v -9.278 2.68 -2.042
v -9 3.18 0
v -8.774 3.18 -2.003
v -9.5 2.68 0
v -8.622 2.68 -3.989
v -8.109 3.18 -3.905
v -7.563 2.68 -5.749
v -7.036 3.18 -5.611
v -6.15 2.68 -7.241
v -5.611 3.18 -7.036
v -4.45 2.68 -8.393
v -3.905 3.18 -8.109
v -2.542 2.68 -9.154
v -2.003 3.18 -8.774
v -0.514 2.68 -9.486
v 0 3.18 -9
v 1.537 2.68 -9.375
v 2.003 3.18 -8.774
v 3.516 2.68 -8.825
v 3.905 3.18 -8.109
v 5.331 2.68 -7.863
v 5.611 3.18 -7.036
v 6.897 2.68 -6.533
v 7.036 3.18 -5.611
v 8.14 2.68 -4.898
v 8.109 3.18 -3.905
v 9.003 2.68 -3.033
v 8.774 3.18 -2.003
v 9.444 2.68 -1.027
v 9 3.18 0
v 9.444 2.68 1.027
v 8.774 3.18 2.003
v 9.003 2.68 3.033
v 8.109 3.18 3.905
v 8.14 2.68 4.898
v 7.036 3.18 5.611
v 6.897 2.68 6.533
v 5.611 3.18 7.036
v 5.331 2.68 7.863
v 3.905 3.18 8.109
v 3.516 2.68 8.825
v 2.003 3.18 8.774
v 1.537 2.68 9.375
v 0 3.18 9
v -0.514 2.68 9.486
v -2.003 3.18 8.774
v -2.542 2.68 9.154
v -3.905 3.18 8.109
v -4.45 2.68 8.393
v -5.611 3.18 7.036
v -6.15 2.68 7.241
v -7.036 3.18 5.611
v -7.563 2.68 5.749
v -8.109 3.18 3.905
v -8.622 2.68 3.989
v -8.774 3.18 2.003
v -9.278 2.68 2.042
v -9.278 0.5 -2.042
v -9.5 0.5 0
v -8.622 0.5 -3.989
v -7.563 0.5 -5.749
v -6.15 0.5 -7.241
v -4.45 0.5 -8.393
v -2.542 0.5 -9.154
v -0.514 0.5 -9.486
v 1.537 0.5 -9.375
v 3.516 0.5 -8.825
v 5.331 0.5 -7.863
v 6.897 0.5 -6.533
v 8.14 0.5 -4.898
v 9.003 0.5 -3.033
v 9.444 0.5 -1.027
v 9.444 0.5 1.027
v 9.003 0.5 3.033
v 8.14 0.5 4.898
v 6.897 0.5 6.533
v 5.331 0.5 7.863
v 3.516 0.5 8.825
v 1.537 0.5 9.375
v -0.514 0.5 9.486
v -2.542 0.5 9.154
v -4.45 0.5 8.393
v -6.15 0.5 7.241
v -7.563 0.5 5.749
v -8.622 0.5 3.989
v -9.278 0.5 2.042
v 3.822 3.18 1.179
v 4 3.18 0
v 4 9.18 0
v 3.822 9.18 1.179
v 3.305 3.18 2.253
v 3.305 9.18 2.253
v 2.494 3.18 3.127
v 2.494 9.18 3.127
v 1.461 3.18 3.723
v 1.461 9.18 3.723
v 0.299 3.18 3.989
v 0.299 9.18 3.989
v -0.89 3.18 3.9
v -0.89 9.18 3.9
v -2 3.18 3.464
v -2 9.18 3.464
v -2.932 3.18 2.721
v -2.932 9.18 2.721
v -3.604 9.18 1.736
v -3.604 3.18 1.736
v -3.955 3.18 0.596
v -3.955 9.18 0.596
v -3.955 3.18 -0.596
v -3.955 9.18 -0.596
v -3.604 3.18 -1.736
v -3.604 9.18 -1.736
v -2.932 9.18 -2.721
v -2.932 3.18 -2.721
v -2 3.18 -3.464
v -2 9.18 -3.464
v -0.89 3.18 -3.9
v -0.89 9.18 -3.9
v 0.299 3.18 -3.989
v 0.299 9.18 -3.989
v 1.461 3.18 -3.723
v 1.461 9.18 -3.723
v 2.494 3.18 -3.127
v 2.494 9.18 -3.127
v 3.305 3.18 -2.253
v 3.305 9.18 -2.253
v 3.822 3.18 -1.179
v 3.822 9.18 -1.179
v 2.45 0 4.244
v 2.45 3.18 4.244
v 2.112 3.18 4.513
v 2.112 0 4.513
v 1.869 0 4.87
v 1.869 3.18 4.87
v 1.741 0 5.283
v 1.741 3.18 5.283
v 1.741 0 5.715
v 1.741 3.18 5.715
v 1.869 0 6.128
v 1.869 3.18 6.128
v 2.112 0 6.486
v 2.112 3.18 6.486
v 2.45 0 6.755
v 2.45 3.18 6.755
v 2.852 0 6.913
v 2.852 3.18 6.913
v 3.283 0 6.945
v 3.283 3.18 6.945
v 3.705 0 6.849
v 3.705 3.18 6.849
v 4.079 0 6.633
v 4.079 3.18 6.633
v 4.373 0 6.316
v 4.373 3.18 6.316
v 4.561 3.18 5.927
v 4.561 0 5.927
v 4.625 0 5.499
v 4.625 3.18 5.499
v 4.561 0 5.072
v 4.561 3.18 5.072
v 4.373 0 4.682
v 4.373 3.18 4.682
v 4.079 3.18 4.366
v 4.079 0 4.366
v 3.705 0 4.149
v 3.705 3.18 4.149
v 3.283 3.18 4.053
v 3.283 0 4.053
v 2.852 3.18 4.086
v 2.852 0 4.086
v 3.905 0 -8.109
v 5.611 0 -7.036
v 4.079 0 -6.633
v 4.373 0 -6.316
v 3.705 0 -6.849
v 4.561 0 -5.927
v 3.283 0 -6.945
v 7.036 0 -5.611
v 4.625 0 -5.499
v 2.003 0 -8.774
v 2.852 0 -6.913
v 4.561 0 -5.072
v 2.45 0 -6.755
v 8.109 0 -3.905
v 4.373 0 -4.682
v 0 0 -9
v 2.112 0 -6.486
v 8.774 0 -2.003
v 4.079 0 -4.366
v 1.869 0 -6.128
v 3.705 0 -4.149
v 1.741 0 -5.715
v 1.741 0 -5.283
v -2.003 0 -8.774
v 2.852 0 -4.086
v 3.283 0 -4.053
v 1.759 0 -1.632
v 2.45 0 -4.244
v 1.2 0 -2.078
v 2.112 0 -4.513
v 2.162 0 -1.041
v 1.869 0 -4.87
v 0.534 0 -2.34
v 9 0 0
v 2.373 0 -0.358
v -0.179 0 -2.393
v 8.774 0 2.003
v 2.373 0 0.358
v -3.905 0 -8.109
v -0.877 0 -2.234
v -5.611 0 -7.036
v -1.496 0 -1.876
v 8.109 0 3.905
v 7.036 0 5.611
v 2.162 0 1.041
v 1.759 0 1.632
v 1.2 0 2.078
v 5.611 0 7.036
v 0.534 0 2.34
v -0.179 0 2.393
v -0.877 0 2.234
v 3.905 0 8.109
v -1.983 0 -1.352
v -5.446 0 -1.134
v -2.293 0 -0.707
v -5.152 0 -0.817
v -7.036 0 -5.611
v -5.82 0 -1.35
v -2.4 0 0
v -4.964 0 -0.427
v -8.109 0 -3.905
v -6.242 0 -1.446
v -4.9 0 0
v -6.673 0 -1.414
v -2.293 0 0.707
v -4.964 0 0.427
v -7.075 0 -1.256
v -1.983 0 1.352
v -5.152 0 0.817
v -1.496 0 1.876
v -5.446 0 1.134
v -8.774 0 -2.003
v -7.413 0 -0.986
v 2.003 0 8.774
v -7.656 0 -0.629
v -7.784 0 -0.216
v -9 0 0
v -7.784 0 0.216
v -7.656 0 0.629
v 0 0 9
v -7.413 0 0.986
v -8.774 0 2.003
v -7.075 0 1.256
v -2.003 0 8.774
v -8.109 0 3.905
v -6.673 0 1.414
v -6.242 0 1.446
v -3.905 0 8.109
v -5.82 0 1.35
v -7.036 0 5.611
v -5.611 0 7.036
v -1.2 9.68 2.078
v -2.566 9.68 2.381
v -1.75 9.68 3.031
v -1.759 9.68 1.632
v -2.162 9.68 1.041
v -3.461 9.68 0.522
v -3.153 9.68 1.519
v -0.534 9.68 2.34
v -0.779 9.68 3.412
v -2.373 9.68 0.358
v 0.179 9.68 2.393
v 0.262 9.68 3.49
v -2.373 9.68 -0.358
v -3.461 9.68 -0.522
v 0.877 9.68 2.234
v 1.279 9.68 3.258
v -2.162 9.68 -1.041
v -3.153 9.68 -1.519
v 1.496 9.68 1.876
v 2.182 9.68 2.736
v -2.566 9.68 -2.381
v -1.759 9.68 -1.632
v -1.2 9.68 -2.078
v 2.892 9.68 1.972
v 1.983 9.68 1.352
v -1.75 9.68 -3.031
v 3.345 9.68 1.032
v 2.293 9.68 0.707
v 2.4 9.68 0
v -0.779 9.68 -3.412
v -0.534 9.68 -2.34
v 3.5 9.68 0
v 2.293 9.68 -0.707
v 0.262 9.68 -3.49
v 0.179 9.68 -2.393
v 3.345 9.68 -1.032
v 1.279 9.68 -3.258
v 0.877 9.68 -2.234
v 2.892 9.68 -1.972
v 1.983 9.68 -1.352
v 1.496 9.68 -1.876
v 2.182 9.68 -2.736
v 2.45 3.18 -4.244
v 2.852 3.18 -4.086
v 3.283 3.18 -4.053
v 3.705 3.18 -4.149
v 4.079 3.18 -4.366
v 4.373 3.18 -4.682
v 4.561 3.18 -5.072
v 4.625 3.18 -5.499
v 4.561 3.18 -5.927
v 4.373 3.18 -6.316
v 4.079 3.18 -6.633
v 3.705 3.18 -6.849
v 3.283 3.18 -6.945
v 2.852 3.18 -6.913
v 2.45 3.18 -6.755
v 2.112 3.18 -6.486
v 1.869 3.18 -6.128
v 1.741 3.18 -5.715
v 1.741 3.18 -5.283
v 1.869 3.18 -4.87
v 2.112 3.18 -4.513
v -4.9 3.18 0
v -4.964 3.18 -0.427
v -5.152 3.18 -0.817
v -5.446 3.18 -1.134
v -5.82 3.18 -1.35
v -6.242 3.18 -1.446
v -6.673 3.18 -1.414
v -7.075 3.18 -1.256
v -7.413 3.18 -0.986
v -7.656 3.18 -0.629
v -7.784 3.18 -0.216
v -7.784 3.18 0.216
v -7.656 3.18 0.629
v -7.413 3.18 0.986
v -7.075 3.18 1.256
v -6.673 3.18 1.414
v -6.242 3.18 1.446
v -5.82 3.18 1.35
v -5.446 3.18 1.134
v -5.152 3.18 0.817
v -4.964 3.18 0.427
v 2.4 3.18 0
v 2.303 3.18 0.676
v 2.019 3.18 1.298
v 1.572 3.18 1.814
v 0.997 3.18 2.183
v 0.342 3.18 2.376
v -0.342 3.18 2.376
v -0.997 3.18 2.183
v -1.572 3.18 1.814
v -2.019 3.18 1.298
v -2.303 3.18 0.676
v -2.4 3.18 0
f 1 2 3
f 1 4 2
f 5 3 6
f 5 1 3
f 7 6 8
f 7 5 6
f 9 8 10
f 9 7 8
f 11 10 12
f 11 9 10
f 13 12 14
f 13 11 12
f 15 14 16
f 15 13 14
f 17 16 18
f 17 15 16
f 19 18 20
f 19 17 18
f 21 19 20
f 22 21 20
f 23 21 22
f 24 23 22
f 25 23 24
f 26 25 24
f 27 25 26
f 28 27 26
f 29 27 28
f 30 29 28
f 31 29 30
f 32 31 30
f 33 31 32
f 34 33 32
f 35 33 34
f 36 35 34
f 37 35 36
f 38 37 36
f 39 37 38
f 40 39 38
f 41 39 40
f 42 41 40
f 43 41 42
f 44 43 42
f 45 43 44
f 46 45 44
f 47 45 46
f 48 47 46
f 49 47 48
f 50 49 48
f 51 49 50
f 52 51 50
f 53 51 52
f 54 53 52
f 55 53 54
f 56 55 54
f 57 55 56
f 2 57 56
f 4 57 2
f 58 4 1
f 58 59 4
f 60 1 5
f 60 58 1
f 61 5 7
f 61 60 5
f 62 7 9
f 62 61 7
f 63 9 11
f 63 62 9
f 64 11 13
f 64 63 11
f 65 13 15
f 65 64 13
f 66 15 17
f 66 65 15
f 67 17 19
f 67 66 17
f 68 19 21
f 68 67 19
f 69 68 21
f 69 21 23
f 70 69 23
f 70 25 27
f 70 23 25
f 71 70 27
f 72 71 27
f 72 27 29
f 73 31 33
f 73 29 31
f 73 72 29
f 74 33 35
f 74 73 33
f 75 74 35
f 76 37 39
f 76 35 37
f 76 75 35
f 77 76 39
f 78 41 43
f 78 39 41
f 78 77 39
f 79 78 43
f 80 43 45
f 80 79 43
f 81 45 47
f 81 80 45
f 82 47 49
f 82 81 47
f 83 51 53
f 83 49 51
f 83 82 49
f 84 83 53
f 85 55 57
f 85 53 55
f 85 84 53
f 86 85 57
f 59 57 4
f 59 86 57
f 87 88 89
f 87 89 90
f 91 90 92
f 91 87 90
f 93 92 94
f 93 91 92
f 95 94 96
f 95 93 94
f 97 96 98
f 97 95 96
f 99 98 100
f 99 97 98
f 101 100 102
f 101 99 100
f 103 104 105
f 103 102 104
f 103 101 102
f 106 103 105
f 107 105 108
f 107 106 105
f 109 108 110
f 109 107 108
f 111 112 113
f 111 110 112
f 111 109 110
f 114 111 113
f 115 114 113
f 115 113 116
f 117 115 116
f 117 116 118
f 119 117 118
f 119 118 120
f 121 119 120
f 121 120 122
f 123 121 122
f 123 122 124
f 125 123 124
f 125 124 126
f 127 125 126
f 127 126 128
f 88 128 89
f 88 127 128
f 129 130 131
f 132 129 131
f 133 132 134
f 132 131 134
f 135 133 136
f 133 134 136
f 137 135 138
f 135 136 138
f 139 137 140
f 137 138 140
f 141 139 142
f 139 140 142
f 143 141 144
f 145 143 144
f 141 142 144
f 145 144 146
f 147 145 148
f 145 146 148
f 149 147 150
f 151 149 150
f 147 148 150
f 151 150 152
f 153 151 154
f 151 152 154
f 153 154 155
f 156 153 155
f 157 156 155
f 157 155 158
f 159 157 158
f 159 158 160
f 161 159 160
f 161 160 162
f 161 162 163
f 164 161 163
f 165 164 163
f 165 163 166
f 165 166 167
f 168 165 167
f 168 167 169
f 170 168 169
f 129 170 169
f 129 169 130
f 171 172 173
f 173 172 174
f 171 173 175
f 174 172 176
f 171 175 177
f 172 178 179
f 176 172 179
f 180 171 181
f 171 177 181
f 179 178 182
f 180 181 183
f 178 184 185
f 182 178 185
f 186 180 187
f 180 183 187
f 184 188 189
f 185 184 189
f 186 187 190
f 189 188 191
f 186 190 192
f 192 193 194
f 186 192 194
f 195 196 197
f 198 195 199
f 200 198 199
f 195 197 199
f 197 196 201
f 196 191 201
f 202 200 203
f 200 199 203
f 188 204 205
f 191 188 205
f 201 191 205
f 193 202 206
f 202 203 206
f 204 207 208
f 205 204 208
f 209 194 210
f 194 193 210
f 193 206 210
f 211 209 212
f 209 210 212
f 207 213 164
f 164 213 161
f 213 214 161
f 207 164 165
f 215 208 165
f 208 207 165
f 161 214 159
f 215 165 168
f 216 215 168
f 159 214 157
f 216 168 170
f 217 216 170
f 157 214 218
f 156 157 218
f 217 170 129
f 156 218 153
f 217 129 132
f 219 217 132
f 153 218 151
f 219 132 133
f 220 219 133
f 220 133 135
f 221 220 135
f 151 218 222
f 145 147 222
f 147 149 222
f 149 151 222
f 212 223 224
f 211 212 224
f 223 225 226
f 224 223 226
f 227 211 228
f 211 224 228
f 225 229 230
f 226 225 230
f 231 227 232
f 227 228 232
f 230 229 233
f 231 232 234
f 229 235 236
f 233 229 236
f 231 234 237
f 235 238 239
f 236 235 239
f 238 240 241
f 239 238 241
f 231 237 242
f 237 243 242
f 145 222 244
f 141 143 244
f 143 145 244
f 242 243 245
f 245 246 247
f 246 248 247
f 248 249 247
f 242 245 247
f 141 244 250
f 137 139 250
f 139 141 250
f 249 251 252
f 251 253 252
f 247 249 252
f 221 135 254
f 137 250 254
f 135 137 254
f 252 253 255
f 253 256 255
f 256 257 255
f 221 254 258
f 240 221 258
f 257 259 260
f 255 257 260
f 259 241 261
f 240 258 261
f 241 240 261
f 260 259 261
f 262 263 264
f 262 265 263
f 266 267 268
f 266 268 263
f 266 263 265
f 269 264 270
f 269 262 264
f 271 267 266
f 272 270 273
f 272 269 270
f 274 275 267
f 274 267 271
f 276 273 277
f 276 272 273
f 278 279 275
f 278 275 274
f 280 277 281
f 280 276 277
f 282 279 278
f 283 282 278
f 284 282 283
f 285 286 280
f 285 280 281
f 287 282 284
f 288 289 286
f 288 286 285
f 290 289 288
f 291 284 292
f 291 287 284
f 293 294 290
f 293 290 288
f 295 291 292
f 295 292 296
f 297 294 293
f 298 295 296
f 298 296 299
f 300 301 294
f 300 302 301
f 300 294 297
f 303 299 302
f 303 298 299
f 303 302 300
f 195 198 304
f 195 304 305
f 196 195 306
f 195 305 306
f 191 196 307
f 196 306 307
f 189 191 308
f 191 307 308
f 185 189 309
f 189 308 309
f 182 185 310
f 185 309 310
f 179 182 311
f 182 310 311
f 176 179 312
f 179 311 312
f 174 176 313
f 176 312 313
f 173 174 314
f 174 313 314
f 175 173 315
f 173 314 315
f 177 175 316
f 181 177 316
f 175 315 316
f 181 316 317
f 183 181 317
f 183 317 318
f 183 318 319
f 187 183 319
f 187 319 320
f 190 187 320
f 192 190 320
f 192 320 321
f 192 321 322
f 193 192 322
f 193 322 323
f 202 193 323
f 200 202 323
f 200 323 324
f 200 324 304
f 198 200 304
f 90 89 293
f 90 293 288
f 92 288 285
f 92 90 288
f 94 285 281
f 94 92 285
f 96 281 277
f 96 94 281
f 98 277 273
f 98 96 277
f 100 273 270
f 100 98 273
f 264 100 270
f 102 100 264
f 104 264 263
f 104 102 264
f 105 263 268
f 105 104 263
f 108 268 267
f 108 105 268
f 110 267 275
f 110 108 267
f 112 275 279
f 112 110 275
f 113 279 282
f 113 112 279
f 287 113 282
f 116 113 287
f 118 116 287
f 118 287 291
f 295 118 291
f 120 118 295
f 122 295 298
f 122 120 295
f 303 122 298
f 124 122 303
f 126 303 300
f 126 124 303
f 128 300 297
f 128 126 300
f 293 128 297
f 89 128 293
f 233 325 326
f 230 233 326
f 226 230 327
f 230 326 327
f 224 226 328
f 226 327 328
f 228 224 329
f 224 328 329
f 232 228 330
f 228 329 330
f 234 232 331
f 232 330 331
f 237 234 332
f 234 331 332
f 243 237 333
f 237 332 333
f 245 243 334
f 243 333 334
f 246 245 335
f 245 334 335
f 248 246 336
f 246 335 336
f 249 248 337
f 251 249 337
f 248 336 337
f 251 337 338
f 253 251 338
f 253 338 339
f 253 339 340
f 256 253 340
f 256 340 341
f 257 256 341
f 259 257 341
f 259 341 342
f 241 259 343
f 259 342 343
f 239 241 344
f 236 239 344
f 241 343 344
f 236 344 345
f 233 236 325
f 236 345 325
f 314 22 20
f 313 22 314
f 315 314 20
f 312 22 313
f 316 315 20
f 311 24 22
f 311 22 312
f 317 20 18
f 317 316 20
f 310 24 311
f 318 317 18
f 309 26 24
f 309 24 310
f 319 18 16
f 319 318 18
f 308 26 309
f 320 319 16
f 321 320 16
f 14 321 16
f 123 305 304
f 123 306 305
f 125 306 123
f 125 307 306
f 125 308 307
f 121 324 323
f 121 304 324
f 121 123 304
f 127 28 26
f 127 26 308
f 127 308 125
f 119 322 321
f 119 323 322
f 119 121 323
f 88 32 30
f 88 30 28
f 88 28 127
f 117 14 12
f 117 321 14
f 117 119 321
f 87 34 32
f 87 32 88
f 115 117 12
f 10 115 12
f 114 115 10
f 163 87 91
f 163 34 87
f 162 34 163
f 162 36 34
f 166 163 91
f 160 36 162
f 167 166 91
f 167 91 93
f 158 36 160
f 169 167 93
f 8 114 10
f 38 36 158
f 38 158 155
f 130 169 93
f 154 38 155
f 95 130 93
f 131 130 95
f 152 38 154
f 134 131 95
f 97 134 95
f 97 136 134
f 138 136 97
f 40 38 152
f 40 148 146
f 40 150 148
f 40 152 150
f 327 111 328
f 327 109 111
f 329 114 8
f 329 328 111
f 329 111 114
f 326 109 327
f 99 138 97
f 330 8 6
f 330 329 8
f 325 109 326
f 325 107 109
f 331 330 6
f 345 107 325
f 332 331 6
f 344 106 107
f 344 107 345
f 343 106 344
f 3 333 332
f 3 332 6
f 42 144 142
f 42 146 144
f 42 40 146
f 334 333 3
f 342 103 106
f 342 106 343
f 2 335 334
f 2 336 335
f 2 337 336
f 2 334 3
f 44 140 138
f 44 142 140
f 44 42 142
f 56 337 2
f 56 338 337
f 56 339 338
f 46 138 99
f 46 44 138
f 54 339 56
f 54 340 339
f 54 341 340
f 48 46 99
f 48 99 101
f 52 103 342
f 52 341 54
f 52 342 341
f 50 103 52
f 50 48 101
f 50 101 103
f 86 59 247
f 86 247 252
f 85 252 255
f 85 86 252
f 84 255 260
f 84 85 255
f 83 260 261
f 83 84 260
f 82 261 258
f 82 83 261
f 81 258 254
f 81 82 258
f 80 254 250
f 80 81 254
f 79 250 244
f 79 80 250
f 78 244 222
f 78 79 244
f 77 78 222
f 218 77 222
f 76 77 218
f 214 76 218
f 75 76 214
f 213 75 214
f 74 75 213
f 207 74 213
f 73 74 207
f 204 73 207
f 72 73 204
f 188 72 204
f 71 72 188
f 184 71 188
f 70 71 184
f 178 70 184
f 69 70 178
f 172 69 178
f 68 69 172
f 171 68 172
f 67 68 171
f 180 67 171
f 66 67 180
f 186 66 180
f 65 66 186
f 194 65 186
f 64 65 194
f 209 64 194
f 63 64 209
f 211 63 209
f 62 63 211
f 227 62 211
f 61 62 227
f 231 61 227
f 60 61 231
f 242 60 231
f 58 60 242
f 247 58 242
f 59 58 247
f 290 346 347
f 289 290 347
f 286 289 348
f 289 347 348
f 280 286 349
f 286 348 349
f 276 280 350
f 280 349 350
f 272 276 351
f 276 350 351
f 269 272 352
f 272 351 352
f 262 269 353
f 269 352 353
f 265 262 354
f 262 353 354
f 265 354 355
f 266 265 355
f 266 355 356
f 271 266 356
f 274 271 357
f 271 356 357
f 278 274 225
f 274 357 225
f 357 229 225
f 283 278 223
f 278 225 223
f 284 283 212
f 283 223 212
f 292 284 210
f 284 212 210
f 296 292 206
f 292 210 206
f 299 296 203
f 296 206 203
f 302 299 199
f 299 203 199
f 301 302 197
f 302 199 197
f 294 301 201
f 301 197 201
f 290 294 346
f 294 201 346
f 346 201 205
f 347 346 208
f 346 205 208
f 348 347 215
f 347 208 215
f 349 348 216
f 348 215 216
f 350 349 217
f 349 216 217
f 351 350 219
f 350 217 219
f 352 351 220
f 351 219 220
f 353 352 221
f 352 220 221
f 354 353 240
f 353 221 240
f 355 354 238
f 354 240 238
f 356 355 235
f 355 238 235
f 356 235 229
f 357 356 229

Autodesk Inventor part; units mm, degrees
ref_plane "YZ Plane" through (0, 0, 0) normal (1, 0, 0) x (0, 1, 0)
ref_plane "XZ Plane" through (0, 0, 0) normal (0, 1, 0) x (-1, 0, 0)
ref_plane "XY Plane" through (0, 0, 0) normal (0, 0, 1) x (1, 0, 0)
sketch "Sketch1" plane through (0, 0, 0) normal (0, 1, 0) x (-1, 0, 0)
  circle A0 centre (0, 0) radius 9.5
  circle A1 centre (0, 0) radius 2.4
  dimension "d0" = 19
  dimension "d1" = 4.8
extrude "Extrusion1" add sketch "Sketch1" along normal blind 3.18
sketch "Sketch2" plane through (0, 3.18, 0) normal (0, 1, 0) x (1, 0, 0)
  circle A0 centre (0, 0) radius 2.4
  circle A1 centre (0, 0) radius 4
  circle A2 centre (0, 0) radius 2.4 projected
  dimension "d4" = 8
extrude "Extrusion2" add sketch "Sketch2" along normal blind 6.5
sketch "Sketch3" plane through (0, 3.18, 0) normal (0, 1, 0) x (1, 0, 0)
  circle A0 centre (-6.35, 0) radius 1.45
  circle A1 centre (0, 0) radius 6.35 construction
  dimension "d8" = 12.7
  dimension "d7" = 2.9
extrude "Extrusion3" cut sketch "Sketch3" against normal blind 6.5
pattern_circular "Circular Pattern1" count 3 over 360 about axis through (0, 3.18, 0) along (0, 1, 0) of "Extrusion3"
chamfer "Chamfer1" distance 0.5 angle 45 3 edges at (-4, 9.68, 0) (9.5, 3.18, 0) (9.5, 0, 0)
properties part number "Nut"
